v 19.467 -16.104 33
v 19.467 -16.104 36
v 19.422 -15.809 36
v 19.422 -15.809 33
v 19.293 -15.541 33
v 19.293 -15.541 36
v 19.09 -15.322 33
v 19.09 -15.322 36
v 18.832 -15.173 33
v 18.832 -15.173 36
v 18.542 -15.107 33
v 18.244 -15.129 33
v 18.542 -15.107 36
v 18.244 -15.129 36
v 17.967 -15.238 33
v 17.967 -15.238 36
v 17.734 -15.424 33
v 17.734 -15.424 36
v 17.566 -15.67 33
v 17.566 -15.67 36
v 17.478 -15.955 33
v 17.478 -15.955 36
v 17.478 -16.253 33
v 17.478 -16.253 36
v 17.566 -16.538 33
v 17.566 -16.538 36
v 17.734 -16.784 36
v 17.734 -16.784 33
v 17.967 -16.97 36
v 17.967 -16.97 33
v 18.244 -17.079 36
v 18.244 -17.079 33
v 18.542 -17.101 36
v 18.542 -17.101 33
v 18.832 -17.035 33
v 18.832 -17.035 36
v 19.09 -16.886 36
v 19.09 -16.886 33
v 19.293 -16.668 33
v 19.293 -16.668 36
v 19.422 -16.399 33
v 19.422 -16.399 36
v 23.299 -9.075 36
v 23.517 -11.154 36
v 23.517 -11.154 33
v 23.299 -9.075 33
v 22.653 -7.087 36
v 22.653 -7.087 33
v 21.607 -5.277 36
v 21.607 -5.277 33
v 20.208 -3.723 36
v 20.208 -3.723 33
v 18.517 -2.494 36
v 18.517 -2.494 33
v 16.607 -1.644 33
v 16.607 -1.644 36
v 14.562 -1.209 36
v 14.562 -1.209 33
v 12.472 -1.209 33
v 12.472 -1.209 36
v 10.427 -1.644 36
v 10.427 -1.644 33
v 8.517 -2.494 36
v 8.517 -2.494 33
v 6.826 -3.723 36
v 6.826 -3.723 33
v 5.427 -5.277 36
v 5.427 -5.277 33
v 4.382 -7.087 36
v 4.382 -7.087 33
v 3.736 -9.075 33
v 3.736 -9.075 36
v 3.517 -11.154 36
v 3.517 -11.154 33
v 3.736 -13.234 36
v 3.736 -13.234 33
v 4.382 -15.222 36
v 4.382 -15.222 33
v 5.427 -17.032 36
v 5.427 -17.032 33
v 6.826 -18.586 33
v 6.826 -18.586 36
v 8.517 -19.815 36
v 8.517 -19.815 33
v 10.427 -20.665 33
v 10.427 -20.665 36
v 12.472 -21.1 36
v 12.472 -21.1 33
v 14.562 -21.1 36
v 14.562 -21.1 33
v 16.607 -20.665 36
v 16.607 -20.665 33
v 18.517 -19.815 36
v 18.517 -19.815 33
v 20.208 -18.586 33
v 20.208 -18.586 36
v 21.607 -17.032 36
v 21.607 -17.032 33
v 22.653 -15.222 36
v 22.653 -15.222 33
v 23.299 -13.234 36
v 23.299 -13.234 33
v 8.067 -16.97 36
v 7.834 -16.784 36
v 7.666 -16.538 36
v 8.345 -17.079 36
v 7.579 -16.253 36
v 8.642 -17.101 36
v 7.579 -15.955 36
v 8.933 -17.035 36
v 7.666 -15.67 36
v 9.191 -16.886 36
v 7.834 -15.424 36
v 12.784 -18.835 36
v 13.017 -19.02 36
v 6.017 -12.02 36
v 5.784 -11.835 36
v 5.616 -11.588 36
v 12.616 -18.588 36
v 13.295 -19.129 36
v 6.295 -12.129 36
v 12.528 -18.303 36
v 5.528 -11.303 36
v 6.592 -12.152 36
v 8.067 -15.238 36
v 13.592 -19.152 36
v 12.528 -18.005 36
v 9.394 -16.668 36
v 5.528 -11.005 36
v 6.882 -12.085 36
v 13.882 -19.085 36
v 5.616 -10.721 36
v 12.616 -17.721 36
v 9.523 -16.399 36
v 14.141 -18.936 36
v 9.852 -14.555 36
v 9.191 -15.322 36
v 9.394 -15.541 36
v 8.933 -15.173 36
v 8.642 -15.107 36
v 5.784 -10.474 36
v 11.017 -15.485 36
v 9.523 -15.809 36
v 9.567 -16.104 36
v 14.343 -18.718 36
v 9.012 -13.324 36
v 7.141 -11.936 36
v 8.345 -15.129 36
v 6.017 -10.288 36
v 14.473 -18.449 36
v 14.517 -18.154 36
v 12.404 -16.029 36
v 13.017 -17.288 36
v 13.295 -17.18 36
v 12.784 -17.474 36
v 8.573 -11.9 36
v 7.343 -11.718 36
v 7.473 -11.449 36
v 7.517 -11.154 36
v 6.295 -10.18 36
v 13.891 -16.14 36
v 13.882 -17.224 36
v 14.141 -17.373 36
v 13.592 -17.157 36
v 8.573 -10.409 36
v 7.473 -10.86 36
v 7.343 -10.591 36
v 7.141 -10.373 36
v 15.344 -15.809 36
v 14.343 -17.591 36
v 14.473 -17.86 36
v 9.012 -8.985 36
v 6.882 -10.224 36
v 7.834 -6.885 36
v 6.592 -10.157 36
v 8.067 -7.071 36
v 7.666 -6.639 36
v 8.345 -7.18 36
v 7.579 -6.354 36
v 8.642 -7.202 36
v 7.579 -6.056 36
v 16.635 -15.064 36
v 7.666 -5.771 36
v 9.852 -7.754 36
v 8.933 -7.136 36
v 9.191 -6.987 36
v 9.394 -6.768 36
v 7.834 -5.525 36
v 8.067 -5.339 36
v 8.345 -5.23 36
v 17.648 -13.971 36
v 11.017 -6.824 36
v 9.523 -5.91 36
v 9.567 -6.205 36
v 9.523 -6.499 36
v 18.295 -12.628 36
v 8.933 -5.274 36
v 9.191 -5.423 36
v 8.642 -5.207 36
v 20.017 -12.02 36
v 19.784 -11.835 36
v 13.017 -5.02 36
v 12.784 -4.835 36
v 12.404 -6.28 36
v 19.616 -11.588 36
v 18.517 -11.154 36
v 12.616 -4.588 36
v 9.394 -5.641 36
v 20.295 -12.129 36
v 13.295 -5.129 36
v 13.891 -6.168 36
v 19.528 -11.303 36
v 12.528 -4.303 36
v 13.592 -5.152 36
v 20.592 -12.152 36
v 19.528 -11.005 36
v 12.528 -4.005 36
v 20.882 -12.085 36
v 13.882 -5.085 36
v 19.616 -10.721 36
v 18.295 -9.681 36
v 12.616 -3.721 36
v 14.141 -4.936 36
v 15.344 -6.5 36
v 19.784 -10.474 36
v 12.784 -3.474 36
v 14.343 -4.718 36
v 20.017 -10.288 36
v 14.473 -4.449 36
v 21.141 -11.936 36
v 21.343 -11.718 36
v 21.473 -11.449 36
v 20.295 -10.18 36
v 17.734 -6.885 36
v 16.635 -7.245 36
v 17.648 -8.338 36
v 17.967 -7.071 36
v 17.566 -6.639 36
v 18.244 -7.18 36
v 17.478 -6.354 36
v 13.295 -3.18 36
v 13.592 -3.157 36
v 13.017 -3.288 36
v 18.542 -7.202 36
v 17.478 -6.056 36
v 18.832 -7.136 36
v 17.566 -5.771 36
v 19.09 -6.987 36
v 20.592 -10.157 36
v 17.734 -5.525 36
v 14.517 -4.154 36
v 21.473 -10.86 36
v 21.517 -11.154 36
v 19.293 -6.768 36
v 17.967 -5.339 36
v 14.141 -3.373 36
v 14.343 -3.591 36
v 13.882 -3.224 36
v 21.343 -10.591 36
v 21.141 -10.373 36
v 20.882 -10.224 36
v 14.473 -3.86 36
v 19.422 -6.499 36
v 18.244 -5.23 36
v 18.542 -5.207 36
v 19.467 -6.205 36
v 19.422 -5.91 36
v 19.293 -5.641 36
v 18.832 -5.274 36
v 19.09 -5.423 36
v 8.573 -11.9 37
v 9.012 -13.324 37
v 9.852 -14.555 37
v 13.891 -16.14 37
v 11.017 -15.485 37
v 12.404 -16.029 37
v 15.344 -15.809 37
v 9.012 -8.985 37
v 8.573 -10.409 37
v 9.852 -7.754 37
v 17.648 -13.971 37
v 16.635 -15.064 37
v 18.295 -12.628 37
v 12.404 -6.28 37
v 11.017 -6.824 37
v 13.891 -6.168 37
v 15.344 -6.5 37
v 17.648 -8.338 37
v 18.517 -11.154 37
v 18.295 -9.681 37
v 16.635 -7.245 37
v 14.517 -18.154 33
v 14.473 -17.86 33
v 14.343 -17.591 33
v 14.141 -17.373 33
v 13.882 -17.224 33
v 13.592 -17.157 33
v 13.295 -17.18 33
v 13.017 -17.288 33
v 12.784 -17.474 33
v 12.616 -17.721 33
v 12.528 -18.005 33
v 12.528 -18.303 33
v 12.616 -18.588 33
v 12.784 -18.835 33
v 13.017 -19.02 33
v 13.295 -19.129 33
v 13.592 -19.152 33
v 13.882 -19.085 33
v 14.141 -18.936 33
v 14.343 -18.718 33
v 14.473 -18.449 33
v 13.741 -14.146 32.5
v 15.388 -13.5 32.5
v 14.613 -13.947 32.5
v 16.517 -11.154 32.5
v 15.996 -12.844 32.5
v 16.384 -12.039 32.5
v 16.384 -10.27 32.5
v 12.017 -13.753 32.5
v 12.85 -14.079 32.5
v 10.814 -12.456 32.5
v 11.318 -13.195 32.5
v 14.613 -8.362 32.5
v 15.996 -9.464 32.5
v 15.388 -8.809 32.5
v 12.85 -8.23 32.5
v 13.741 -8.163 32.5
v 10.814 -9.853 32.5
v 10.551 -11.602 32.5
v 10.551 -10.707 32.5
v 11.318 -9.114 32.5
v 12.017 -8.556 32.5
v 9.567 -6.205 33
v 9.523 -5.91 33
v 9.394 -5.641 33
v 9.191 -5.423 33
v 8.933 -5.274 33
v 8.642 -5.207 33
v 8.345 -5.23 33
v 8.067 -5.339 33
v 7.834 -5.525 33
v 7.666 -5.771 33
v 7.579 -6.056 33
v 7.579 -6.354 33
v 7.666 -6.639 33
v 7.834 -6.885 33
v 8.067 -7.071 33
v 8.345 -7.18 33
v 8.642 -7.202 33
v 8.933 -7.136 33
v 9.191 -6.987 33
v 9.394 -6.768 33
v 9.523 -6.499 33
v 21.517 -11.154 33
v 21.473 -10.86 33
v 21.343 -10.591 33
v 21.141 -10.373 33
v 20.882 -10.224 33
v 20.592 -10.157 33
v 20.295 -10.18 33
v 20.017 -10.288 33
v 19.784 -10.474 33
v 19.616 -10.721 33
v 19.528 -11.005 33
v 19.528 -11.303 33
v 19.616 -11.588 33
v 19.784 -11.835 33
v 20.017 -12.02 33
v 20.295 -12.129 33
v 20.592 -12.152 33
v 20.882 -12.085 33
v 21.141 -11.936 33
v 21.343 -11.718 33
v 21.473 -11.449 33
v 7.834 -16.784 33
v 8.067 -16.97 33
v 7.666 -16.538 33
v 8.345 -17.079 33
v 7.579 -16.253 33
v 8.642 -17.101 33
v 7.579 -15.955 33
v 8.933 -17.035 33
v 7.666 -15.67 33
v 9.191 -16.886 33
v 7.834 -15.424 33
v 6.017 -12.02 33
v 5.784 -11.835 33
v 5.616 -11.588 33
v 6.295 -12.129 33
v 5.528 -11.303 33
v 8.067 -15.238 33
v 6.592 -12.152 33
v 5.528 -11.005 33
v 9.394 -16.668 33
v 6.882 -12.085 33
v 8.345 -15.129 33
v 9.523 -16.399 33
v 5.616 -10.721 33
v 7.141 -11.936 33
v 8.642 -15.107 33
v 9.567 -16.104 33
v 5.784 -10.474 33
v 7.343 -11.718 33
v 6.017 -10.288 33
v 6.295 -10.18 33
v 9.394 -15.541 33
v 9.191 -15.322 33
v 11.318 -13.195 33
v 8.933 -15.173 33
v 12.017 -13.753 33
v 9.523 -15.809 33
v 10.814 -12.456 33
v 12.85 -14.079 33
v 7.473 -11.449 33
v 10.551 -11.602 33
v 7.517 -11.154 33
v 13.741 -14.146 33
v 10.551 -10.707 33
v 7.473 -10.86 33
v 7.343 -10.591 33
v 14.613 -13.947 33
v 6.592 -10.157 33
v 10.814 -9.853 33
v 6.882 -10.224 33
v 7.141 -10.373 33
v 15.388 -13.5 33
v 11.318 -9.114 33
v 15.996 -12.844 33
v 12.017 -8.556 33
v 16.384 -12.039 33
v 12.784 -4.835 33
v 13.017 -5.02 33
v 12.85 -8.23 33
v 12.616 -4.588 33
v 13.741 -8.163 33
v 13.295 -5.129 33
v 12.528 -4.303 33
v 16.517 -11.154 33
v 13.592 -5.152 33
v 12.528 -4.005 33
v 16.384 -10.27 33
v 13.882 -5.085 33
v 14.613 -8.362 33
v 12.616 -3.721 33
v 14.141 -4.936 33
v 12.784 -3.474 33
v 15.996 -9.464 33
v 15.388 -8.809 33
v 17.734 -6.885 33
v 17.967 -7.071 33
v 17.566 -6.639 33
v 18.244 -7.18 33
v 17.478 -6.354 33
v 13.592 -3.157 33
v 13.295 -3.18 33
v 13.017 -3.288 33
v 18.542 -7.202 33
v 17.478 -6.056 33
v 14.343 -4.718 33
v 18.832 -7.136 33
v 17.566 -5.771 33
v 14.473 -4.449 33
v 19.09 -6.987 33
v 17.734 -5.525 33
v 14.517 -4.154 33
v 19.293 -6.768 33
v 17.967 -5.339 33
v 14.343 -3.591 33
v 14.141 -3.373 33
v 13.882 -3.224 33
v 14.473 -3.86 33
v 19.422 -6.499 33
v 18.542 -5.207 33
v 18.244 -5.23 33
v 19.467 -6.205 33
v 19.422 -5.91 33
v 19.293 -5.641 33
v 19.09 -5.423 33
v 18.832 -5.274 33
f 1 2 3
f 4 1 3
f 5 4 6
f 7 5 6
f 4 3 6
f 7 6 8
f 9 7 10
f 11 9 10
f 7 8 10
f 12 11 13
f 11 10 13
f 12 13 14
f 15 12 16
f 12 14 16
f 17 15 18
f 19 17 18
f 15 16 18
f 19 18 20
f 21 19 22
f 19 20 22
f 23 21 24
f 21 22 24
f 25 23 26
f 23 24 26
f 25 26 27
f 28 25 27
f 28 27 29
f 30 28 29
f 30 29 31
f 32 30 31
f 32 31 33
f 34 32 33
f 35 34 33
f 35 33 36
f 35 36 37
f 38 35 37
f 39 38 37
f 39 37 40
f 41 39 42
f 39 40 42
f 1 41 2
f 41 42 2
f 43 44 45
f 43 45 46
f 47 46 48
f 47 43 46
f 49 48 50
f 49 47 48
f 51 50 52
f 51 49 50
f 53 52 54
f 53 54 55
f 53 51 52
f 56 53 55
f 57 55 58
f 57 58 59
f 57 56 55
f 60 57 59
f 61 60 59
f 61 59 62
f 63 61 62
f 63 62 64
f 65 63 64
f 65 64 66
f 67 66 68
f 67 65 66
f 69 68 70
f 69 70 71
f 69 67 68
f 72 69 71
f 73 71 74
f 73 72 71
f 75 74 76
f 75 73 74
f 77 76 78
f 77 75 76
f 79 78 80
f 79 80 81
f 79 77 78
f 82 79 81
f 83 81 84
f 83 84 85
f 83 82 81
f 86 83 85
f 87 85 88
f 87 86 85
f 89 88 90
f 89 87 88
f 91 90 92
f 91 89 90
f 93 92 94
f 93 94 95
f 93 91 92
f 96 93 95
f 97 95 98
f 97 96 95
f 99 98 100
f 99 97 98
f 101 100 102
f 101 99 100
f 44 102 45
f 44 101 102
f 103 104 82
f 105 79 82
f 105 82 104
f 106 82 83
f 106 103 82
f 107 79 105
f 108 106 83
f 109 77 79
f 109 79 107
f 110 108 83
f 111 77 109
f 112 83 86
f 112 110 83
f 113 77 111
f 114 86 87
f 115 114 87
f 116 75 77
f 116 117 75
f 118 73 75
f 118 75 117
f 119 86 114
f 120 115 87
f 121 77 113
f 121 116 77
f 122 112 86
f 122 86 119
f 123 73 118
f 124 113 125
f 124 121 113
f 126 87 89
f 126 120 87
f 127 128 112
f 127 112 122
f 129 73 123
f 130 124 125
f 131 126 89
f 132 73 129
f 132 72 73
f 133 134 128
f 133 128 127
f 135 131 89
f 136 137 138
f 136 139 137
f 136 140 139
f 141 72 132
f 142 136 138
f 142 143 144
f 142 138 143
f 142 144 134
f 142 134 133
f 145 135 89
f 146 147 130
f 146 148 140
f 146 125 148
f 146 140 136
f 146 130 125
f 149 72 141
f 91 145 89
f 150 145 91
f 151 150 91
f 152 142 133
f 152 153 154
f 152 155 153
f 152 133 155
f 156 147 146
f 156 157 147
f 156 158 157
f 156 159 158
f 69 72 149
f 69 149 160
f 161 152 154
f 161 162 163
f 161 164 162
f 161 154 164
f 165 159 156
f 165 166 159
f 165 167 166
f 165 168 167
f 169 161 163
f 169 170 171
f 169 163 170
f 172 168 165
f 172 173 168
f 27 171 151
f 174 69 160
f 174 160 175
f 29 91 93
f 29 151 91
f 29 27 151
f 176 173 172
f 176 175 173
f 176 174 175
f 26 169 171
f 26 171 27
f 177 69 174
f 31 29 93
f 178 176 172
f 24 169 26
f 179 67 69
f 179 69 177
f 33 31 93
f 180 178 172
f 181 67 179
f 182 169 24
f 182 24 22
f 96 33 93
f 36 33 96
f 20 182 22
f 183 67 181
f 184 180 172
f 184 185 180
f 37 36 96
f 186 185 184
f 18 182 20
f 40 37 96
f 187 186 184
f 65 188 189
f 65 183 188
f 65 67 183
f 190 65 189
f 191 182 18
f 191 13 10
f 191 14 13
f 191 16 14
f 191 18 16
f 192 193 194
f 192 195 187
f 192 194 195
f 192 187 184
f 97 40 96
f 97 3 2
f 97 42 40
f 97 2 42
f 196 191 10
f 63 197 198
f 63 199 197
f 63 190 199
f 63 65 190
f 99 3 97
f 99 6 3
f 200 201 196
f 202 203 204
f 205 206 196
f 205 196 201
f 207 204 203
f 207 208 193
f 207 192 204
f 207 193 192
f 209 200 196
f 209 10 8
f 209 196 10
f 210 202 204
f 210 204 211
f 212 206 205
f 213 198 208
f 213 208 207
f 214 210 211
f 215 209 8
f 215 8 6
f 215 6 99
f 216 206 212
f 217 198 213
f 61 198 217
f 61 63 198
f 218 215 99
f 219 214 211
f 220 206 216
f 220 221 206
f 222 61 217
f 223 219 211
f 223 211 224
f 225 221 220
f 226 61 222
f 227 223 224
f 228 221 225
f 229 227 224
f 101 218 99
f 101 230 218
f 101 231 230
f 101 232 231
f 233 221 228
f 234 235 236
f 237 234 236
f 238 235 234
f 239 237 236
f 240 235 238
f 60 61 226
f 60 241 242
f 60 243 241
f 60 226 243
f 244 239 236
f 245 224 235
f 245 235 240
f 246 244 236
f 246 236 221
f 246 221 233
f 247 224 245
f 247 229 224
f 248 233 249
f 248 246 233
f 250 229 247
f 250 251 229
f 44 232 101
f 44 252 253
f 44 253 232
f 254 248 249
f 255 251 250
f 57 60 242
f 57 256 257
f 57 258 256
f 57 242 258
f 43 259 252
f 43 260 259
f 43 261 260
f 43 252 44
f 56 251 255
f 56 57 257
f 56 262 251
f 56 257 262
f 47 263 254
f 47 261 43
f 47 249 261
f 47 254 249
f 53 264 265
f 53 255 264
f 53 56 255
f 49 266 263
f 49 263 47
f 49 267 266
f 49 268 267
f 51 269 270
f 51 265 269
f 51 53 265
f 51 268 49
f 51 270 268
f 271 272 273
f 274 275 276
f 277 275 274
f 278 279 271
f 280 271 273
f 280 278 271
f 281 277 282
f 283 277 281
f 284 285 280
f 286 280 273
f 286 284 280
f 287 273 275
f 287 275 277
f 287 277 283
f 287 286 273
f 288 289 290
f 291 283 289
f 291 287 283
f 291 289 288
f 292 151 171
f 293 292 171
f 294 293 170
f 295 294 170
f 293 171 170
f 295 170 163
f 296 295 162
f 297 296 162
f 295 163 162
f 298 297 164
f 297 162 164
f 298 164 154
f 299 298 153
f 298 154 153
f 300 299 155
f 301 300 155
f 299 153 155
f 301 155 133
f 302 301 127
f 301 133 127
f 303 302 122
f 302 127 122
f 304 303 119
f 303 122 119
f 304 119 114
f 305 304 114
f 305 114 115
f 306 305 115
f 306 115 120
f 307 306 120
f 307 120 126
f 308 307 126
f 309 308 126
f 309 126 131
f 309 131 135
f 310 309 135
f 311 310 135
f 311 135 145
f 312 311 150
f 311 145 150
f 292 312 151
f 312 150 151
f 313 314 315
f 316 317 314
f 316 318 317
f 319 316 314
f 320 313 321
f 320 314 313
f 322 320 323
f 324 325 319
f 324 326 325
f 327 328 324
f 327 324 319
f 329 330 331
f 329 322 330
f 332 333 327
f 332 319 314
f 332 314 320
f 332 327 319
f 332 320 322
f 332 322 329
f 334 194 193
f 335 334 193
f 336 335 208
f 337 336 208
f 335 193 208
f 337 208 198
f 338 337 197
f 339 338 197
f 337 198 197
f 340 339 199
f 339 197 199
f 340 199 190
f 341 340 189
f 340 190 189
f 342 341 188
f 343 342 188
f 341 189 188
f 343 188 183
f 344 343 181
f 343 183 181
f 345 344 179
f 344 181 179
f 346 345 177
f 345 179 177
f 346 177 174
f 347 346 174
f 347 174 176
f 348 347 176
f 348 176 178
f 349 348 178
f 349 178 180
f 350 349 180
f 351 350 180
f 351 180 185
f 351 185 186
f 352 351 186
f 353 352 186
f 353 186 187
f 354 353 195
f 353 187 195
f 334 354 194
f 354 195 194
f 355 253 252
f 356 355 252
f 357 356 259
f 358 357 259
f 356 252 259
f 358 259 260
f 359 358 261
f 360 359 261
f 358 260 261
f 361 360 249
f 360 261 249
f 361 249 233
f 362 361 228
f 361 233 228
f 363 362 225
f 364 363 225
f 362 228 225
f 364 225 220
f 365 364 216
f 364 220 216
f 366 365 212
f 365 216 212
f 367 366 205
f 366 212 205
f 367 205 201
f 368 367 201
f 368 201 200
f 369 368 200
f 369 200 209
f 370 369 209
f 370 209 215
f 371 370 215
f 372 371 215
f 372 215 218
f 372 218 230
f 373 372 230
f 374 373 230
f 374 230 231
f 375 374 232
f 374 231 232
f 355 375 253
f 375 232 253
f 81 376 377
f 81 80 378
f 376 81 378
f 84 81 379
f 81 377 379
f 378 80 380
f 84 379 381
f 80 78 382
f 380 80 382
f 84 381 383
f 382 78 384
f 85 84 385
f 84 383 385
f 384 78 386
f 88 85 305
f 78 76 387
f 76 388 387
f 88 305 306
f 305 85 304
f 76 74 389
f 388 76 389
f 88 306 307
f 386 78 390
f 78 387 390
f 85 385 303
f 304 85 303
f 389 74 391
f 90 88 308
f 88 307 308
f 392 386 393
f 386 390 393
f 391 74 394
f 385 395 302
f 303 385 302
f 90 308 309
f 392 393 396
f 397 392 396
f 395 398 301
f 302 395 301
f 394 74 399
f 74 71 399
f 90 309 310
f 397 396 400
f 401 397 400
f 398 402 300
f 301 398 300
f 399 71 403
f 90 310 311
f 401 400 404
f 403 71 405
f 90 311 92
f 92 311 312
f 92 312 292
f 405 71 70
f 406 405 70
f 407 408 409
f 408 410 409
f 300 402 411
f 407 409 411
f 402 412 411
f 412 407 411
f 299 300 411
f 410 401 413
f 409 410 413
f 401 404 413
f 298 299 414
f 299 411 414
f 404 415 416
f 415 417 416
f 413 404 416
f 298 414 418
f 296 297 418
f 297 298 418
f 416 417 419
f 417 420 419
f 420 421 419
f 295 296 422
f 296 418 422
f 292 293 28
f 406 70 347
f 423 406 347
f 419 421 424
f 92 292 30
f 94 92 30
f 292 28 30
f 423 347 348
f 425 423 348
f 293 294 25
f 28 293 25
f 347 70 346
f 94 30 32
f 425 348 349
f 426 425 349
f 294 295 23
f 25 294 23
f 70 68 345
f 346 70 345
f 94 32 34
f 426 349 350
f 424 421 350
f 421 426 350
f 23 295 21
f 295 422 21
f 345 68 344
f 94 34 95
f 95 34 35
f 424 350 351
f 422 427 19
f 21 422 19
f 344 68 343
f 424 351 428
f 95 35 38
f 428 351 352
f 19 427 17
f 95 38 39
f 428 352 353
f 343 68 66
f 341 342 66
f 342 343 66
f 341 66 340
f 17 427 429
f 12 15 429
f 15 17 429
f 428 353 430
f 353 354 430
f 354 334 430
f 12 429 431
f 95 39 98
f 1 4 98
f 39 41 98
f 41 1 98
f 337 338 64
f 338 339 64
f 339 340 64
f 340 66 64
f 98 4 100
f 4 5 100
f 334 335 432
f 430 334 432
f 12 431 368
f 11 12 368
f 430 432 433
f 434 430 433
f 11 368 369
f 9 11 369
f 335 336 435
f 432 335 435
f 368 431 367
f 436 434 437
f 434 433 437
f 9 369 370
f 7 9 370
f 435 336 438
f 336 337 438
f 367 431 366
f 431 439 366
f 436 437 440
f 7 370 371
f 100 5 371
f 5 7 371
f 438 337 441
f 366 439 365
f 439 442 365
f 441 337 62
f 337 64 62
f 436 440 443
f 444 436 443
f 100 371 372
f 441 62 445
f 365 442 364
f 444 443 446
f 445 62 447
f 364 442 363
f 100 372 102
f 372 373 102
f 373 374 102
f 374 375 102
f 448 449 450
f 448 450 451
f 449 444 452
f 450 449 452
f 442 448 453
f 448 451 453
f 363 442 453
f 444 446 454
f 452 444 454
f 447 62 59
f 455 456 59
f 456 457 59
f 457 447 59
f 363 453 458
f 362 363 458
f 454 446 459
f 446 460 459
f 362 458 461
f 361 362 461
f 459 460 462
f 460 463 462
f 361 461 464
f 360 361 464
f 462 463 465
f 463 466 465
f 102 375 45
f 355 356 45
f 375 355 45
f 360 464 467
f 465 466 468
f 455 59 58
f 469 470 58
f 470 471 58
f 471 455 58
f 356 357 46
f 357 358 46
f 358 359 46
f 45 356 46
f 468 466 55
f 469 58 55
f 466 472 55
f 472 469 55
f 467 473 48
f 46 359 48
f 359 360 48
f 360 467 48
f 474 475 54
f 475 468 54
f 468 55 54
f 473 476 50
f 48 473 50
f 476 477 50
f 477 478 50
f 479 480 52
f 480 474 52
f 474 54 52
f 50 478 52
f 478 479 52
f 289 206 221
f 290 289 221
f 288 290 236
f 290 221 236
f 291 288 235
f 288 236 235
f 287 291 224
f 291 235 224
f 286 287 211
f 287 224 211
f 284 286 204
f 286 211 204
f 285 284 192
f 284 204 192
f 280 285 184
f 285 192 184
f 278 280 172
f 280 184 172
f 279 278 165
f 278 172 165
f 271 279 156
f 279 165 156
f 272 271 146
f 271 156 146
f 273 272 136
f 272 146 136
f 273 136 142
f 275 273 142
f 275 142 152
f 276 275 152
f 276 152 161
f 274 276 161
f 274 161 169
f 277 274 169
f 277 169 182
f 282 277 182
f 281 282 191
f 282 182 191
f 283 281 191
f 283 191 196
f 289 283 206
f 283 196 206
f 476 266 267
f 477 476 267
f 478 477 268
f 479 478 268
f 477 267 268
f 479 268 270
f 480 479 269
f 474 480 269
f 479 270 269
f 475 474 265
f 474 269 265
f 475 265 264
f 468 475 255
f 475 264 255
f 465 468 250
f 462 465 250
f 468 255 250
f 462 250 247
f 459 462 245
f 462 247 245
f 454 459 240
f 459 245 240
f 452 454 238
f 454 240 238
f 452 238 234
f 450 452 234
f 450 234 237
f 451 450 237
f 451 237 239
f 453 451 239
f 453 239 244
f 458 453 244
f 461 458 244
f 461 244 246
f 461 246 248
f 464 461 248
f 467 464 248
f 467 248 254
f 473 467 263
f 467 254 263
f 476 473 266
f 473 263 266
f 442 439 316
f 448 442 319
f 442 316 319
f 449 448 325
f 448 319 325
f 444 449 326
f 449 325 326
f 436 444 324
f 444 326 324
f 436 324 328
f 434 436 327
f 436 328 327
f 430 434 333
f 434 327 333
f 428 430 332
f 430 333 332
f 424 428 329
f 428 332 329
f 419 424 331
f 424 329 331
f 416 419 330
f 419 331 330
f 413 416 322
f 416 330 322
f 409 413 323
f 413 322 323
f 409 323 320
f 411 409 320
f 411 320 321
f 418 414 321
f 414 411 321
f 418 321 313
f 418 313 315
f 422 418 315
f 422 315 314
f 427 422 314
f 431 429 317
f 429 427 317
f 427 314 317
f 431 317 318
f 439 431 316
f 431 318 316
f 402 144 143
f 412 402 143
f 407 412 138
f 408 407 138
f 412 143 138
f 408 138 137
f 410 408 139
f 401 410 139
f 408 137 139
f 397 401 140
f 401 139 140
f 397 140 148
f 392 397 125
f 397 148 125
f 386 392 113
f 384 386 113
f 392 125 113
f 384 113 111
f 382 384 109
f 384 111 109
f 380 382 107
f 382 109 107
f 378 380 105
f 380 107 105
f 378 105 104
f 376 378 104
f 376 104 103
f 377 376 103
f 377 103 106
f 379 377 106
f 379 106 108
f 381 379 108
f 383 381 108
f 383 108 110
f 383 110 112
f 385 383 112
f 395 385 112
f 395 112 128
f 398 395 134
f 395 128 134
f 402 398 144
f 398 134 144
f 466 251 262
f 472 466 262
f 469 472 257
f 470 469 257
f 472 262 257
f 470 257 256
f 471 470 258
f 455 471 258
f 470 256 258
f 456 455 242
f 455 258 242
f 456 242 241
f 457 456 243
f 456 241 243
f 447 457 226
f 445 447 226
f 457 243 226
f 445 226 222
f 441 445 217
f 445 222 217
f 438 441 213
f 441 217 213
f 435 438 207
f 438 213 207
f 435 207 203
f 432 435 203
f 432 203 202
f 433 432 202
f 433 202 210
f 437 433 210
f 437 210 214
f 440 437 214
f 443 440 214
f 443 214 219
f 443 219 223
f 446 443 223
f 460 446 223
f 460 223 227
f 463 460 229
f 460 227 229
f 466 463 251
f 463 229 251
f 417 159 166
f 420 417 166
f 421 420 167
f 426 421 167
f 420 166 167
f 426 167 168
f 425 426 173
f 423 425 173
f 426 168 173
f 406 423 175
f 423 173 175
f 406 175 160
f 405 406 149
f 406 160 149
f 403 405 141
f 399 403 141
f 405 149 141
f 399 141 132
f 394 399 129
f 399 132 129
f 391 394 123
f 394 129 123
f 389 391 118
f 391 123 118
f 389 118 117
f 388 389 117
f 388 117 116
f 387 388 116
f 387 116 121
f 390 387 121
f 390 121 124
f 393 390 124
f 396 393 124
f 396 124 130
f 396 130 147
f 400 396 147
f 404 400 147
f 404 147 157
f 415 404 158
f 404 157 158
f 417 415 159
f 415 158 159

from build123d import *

# Parameters (mm, degrees)
SKETCH_1_R          = 1
EXTRUDE_1_DEPTH     = 32.5
SKETCH_2_R          = 3
EXTRUDE_2_DEPTH     = 3.5
SKETCH_3_R          = 10
EXTRUDE_3_DEPTH     = 3
SKETCH_4_R          = 5
EXTRUDE_4_DEPTH     = 1
SKETCH_5_R          = 1
CUT_EXTRUDE_1_DEPTH = 3
SKETCH_6_W          = 52.078633919
SKETCH_6_H          = 39.097037898
CUT_EXTRUDE_2_DEPTH = 32.5


with BuildPart() as part:
    # ｽｹｯﾁ1 → ﾎﾞｽ - 押し出し1 (new body)
    with BuildSketch(Plane.XY):
        with BuildLine():
            Line((-17.482907979, 4.845565749), (13.517092021, 4.845565749))
            ThreePointArc((13.517092021, 4.845565749), (20.100097265, 3.428570993), (25.517092021, -0.571429007))
            Line((25.517092021, -0.571429007), (25.517092021, -21.737439495))
            ThreePointArc((25.517092021, -21.737439495), (20.100097265, -25.737439495), (13.517092021, -27.154434251))
            Line((13.517092021, -27.154434251), (-17.482907979, -27.154434251))
            Line((-17.482907979, -27.154434251), (-17.482907979, 4.845565749))
        make_face()
        with Locations((-14.482907979, -24.654434251)):
            Circle(SKETCH_1_R, mode=Mode.SUBTRACT)
        with Locations((12.517092021, -24.654434251)):
            Circle(SKETCH_1_R, mode=Mode.SUBTRACT)
        with Locations((12.517092021, 2.345565749)):
            Circle(SKETCH_1_R, mode=Mode.SUBTRACT)
        with Locations((-14.482907979, 2.345565749)):
            Circle(SKETCH_1_R, mode=Mode.SUBTRACT)
    extrude(amount=EXTRUDE_1_DEPTH)

    # ｽｹｯﾁ2 → ﾎﾞｽ - 押し出し2 (add)
    with BuildSketch(Plane.XY.offset(32.5)):
        with Locations((13.517092021, -11.154434251)):
            Circle(SKETCH_2_R)
    extrude(amount=EXTRUDE_2_DEPTH)

    # ｽｹｯﾁ3 → ﾎﾞｽ - 押し出し3 (add)
    with BuildSketch(Plane.XY.offset(36)):
        with Locations((13.517092021, -11.154434251)):
            Circle(SKETCH_3_R)
    extrude(amount=-EXTRUDE_3_DEPTH)

    # ｽｹｯﾁ4 → ﾎﾞｽ - 押し出し4 (add)
    with BuildSketch(Plane.XY.offset(36)):
        with Locations((13.517092021, -11.154434251)):
            Circle(SKETCH_4_R)
    extrude(amount=EXTRUDE_4_DEPTH)

    # ｽｹｯﾁ5 → ｶｯﾄ - 押し出し1 (cut)
    with BuildSketch(Plane.XY.offset(36)):
        with Locations((20.517092021, -11.154434251)):
            Circle(SKETCH_5_R)
        with Locations((18.466839489, -16.104181719)):
            Circle(SKETCH_5_R)
        with Locations((13.517092021, -18.154434251)):
            Circle(SKETCH_5_R)
        with Locations((8.567344553, -16.104181719)):
            Circle(SKETCH_5_R)
        with Locations((6.517092021, -11.154434251)):
            Circle(SKETCH_5_R)
        with Locations((8.567344553, -6.204686782)):
            Circle(SKETCH_5_R)
        with Locations((13.517092021, -4.154434251)):
            Circle(SKETCH_5_R)
        with Locations((18.466839489, -6.204686782)):
            Circle(SKETCH_5_R)
    extrude(amount=-CUT_EXTRUDE_1_DEPTH, mode=Mode.SUBTRACT)

    # ｽｹｯﾁ6 → ｶｯﾄ - 押し出し2 (cut)
    with BuildSketch(Plane(origin=(0, 0, 0), x_dir=(-1, 0, 0), z_dir=(0, 0, -1))):
        with Locations((-8.556408981, -7.605915302)):
            Rectangle(SKETCH_6_W, SKETCH_6_H)
    extrude(amount=-CUT_EXTRUDE_2_DEPTH, mode=Mode.SUBTRACT)


solid = part.part
